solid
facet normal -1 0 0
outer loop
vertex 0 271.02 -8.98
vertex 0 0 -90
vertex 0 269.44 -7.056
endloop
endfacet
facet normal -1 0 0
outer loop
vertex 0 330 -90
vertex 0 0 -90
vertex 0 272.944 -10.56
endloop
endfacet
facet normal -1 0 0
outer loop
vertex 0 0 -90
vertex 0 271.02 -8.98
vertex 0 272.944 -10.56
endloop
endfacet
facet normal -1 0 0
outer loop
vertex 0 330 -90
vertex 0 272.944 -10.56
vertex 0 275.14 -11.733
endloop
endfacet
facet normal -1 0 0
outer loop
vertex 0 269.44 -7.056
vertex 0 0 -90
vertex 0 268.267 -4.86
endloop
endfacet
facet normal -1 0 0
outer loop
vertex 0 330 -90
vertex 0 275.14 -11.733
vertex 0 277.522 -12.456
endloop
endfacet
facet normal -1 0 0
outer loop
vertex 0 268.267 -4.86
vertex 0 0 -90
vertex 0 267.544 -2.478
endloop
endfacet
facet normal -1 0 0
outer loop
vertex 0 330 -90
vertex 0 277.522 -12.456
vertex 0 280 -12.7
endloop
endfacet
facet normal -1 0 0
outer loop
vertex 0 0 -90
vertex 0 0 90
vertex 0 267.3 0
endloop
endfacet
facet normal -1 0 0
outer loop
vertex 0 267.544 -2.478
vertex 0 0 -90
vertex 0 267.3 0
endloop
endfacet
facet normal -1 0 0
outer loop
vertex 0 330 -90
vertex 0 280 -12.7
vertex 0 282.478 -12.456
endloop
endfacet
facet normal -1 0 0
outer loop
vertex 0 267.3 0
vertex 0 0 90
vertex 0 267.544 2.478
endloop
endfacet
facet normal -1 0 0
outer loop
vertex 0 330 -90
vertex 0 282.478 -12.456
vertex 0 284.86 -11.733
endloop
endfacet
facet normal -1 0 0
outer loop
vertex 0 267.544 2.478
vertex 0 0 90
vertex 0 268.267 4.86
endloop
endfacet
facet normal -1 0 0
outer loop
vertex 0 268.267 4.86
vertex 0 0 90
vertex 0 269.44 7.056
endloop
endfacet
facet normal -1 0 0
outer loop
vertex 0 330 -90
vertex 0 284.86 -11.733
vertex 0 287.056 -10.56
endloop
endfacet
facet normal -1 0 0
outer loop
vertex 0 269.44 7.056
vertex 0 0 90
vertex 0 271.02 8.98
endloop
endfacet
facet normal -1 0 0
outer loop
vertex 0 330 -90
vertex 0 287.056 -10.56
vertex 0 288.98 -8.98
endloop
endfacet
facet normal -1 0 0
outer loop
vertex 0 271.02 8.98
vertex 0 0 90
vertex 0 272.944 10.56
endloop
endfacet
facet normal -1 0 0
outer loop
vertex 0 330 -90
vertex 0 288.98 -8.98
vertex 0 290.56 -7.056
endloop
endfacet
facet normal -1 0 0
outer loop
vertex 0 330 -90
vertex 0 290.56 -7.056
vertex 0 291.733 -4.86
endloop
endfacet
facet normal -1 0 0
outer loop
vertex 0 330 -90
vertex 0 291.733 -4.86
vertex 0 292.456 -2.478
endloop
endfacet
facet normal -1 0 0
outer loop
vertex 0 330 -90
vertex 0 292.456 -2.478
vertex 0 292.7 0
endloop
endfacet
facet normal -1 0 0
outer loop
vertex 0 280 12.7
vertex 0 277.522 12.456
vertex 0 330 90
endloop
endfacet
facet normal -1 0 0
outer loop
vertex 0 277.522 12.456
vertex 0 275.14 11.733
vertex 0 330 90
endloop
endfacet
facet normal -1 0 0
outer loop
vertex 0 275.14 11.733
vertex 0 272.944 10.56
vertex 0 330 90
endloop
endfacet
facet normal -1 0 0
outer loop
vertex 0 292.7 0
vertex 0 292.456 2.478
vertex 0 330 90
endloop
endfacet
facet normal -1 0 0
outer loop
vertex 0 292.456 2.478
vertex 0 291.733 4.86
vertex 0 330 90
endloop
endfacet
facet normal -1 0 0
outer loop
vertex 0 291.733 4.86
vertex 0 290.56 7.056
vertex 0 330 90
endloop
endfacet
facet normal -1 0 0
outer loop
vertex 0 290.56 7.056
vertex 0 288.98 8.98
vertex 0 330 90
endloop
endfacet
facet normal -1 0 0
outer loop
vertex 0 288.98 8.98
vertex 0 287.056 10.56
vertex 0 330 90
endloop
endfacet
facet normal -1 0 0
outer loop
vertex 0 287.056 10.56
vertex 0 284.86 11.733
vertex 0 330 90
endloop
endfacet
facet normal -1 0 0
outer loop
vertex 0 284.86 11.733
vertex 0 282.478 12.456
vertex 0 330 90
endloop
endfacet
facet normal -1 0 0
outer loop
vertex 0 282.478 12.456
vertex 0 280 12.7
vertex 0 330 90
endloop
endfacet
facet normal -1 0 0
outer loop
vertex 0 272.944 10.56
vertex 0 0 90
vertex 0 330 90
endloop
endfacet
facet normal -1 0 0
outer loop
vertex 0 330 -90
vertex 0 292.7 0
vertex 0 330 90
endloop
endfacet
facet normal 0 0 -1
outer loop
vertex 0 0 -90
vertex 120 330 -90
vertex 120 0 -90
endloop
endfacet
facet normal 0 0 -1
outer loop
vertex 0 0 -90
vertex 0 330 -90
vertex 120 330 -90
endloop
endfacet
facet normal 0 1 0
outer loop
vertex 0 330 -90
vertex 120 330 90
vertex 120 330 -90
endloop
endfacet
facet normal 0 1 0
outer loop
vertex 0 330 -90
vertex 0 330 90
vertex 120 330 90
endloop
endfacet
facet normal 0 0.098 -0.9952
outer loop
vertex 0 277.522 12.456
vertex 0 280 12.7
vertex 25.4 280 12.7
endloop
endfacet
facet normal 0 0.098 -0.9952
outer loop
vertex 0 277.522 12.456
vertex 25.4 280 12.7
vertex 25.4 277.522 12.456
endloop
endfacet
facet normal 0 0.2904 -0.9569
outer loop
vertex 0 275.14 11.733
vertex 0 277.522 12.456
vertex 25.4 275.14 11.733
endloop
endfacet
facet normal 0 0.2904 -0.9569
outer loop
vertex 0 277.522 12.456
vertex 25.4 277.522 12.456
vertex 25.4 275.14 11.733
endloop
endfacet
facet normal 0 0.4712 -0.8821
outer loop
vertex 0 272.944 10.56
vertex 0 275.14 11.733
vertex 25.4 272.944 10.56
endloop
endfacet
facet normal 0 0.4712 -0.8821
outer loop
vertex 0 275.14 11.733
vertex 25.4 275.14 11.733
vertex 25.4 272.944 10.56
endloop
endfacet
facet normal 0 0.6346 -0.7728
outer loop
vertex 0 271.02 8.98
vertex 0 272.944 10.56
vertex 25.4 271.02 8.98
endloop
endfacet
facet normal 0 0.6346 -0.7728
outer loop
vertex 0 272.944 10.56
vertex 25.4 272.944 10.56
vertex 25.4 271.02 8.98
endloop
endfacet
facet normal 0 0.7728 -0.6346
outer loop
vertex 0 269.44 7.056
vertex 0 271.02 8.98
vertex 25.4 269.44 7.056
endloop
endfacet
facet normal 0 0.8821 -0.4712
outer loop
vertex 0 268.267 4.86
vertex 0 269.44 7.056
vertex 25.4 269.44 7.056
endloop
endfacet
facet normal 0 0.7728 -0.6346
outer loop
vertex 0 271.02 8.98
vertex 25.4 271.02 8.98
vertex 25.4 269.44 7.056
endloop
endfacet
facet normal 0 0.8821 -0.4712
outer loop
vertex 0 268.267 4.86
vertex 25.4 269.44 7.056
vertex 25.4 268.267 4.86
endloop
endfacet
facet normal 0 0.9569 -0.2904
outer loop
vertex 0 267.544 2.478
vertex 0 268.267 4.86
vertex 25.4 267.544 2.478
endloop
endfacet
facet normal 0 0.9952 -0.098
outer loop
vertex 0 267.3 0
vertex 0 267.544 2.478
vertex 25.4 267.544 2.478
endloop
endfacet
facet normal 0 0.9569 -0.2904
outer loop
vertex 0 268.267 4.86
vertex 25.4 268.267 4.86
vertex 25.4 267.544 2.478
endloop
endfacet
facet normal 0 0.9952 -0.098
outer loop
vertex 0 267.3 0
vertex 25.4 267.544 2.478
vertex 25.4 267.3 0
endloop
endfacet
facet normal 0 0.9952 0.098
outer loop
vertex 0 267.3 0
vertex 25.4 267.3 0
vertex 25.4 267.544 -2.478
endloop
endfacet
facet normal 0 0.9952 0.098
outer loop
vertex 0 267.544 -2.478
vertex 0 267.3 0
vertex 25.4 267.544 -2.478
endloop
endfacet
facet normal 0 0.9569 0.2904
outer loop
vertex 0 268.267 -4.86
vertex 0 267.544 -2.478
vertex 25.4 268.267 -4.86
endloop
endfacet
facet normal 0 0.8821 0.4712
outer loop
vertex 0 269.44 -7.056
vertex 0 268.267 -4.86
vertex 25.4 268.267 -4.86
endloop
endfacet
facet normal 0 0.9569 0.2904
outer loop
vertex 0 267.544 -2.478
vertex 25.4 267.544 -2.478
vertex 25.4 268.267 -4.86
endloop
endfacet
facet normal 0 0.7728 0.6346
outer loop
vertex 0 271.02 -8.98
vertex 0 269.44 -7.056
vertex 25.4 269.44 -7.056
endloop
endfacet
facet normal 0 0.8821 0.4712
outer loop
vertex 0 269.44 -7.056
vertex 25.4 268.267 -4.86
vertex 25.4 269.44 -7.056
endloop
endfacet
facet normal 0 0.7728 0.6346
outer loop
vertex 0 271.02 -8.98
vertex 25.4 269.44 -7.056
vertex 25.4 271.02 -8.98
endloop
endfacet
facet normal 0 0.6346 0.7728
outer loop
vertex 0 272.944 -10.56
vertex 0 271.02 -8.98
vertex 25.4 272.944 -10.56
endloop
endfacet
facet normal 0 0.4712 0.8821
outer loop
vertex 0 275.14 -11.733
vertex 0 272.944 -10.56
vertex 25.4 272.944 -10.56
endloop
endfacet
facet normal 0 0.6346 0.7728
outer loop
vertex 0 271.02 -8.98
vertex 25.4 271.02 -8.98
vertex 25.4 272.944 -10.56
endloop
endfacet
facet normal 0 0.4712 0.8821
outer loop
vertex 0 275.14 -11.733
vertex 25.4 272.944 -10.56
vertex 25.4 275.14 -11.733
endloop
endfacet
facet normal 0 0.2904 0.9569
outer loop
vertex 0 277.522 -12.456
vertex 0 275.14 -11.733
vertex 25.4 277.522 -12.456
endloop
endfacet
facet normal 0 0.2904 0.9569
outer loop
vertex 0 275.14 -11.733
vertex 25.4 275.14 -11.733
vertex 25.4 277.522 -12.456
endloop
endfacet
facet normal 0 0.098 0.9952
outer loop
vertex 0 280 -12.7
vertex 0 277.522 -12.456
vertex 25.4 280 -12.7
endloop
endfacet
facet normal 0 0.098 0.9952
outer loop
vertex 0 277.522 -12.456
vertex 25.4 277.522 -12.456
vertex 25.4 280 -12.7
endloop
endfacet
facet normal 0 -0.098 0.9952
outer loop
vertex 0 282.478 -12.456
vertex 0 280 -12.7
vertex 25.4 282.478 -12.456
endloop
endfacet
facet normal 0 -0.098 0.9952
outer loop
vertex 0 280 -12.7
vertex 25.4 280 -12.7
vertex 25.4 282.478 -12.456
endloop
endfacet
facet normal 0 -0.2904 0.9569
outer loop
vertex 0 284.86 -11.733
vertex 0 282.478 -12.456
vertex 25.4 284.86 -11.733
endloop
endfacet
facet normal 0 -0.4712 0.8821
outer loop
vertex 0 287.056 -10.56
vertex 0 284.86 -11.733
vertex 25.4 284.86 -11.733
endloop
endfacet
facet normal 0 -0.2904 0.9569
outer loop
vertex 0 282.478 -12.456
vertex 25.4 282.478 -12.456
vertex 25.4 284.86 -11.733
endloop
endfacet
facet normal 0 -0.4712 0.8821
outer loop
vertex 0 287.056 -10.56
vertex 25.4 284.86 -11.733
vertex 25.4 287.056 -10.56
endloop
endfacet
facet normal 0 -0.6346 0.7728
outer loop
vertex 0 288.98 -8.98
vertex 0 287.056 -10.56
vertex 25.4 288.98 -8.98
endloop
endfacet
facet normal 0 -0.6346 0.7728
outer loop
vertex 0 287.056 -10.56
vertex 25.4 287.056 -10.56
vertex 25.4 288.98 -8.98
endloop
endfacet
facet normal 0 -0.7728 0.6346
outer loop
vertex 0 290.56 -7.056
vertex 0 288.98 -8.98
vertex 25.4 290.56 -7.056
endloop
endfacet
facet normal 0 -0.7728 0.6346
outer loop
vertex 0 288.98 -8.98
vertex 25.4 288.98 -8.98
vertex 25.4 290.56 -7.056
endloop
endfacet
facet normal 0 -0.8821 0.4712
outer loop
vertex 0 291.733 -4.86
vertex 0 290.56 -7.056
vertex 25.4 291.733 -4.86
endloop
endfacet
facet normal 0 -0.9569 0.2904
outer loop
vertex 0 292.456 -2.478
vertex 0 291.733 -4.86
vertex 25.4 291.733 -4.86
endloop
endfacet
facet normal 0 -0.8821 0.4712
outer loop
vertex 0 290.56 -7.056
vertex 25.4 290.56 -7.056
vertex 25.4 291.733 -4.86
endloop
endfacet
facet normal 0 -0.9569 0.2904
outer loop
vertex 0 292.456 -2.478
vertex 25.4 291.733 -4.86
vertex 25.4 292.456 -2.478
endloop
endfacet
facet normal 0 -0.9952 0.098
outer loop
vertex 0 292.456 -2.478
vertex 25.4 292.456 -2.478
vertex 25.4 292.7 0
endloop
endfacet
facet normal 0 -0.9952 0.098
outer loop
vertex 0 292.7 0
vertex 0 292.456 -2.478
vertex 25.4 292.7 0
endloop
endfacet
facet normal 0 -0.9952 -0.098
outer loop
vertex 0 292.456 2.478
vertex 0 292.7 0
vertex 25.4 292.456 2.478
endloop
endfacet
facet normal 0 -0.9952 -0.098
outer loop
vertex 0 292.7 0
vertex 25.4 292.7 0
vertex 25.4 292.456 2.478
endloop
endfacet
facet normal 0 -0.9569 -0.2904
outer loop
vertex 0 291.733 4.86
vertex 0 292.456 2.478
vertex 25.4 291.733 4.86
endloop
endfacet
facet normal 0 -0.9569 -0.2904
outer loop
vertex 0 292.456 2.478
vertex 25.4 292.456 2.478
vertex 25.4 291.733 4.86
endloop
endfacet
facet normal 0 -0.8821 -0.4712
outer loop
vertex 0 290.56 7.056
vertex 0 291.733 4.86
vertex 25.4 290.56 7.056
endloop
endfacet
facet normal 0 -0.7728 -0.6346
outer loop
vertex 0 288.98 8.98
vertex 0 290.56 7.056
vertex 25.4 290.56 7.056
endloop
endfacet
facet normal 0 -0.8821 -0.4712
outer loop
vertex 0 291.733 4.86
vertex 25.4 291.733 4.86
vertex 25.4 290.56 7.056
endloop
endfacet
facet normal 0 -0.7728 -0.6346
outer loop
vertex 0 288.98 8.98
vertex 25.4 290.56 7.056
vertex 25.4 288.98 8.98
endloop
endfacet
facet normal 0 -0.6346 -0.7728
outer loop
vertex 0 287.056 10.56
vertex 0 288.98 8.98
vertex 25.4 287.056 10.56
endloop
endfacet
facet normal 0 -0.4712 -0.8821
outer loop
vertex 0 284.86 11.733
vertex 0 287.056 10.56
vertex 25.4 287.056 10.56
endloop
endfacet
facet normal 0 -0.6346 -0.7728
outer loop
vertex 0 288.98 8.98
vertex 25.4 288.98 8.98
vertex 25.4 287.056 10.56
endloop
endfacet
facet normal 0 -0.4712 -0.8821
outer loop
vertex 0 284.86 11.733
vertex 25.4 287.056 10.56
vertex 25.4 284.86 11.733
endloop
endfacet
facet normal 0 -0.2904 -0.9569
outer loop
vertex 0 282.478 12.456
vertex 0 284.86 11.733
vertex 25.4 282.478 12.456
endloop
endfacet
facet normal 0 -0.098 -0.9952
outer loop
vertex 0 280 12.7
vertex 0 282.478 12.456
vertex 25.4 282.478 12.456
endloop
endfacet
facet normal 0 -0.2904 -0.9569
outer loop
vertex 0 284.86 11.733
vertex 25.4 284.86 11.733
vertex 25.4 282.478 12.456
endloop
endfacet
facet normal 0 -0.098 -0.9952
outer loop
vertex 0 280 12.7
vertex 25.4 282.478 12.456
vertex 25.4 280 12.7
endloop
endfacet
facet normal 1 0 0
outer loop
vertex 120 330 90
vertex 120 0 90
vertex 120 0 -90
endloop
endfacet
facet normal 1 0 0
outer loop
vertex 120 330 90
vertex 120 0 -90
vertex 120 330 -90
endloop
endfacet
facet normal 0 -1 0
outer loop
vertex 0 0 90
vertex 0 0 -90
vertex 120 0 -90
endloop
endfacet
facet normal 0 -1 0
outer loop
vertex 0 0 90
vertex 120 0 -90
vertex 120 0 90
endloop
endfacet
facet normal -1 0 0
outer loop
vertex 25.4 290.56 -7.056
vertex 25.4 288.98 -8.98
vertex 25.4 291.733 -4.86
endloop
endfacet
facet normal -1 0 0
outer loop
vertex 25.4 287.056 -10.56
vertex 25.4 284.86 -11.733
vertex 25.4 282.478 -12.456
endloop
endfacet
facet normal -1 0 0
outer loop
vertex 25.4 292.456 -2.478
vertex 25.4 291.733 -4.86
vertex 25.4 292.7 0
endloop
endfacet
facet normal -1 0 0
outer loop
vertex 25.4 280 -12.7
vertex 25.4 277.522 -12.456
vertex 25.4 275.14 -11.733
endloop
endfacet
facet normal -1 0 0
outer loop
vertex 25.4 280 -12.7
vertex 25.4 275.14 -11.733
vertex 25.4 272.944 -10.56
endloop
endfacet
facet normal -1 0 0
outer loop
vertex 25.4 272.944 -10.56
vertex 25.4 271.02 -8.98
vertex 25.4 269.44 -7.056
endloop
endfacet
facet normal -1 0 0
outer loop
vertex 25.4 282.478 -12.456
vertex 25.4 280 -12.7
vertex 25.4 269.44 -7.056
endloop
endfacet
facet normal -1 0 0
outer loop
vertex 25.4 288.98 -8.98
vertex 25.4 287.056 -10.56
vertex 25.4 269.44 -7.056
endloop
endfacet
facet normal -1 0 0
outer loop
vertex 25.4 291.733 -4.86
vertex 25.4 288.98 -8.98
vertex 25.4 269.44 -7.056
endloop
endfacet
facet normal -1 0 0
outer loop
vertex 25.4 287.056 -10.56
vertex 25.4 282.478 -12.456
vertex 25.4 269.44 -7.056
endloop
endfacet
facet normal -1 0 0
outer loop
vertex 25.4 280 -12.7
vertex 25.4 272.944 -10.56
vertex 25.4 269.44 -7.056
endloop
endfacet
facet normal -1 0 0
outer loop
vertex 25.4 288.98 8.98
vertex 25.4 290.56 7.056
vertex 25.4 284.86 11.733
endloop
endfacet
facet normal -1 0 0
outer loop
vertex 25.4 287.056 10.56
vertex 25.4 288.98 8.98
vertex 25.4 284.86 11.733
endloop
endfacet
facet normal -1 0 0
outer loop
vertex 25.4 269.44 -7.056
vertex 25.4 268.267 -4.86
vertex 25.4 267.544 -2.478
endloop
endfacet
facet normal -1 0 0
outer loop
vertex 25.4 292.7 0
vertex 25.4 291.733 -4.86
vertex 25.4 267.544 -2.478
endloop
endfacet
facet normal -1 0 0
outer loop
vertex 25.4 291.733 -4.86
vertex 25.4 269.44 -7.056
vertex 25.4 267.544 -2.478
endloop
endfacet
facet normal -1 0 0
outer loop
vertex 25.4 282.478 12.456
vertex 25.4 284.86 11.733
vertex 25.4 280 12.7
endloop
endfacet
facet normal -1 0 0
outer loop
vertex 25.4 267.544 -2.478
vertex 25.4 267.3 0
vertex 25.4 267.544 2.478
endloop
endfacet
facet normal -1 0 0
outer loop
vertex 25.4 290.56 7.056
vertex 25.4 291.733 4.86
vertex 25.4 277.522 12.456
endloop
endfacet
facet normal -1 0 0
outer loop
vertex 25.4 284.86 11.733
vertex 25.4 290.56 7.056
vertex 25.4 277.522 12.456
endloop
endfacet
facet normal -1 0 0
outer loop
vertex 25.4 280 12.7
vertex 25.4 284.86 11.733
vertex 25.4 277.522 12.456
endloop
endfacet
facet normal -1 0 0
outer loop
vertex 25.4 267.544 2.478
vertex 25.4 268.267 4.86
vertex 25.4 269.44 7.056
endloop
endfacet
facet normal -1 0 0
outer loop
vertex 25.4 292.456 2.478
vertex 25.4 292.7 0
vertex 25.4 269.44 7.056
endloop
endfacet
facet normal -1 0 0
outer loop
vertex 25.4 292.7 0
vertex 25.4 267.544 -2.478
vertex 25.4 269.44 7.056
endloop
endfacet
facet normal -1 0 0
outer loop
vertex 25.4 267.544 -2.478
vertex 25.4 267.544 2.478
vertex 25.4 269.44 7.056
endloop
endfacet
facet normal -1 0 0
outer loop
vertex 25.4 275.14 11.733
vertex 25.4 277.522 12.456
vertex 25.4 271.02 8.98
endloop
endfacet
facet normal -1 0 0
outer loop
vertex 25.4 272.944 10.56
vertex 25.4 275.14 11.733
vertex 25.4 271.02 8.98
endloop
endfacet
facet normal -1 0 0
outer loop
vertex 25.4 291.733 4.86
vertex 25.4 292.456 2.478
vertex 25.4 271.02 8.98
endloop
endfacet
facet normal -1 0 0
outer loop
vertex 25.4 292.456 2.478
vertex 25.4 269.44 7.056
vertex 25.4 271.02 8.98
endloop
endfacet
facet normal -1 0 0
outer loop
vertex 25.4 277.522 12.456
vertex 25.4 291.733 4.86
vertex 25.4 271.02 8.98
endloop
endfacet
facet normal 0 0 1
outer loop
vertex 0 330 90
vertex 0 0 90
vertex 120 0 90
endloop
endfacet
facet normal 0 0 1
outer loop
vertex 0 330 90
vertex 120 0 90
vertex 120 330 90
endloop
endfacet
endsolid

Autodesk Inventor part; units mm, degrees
ref_plane "YZ Plane" through (0, 0, 0) normal (1, 0, 0) x (0, 1, 0)
ref_plane "XZ Plane" through (0, 0, 0) normal (0, 1, 0) x (-1, 0, 0)
ref_plane "XY Plane" through (0, 0, 0) normal (0, 0, 1) x (1, 0, 0)
sketch "Sketch1" plane through (0, 0, 0) normal (1, 0, 0) x (0, 1, 0)
  line L0 (0, 90) -> (330, 90)
  line L1 (330, 90) -> (330, -90)
  line L2 (330, -90) -> (0, -90)
  line L3 (0, -90) -> (0, 90)
  line L4 (0, 0) -> (345.997, 0) construction
  dimension "d0" = 330
  dimension "d1" = 180
extrude "Extrusion1" add sketch "Sketch1" along normal blind 120
sketch "Sketch2" plane through (120, 0, 0) normal (1, 0, 0) x (0, 0, -1)
  line L0 (-5.1081, 224.8212) -> (8.9019, 224.8212) construction
  line L1 (8.9019, 224.8212) -> (8.9019, 216.6905) construction
  line L2 (8.9019, 216.6905) -> (-5.1081, 216.6905) construction
  line L3 (-5.1081, 216.6905) -> (-5.1081, 224.8212) construction
  point P0 (0, 0)
hole "Hole1" at (0, 280, 0) direction (1, 0, 0) diameter 25.4 depth 25.4
properties part number "RFI_power_filter"
